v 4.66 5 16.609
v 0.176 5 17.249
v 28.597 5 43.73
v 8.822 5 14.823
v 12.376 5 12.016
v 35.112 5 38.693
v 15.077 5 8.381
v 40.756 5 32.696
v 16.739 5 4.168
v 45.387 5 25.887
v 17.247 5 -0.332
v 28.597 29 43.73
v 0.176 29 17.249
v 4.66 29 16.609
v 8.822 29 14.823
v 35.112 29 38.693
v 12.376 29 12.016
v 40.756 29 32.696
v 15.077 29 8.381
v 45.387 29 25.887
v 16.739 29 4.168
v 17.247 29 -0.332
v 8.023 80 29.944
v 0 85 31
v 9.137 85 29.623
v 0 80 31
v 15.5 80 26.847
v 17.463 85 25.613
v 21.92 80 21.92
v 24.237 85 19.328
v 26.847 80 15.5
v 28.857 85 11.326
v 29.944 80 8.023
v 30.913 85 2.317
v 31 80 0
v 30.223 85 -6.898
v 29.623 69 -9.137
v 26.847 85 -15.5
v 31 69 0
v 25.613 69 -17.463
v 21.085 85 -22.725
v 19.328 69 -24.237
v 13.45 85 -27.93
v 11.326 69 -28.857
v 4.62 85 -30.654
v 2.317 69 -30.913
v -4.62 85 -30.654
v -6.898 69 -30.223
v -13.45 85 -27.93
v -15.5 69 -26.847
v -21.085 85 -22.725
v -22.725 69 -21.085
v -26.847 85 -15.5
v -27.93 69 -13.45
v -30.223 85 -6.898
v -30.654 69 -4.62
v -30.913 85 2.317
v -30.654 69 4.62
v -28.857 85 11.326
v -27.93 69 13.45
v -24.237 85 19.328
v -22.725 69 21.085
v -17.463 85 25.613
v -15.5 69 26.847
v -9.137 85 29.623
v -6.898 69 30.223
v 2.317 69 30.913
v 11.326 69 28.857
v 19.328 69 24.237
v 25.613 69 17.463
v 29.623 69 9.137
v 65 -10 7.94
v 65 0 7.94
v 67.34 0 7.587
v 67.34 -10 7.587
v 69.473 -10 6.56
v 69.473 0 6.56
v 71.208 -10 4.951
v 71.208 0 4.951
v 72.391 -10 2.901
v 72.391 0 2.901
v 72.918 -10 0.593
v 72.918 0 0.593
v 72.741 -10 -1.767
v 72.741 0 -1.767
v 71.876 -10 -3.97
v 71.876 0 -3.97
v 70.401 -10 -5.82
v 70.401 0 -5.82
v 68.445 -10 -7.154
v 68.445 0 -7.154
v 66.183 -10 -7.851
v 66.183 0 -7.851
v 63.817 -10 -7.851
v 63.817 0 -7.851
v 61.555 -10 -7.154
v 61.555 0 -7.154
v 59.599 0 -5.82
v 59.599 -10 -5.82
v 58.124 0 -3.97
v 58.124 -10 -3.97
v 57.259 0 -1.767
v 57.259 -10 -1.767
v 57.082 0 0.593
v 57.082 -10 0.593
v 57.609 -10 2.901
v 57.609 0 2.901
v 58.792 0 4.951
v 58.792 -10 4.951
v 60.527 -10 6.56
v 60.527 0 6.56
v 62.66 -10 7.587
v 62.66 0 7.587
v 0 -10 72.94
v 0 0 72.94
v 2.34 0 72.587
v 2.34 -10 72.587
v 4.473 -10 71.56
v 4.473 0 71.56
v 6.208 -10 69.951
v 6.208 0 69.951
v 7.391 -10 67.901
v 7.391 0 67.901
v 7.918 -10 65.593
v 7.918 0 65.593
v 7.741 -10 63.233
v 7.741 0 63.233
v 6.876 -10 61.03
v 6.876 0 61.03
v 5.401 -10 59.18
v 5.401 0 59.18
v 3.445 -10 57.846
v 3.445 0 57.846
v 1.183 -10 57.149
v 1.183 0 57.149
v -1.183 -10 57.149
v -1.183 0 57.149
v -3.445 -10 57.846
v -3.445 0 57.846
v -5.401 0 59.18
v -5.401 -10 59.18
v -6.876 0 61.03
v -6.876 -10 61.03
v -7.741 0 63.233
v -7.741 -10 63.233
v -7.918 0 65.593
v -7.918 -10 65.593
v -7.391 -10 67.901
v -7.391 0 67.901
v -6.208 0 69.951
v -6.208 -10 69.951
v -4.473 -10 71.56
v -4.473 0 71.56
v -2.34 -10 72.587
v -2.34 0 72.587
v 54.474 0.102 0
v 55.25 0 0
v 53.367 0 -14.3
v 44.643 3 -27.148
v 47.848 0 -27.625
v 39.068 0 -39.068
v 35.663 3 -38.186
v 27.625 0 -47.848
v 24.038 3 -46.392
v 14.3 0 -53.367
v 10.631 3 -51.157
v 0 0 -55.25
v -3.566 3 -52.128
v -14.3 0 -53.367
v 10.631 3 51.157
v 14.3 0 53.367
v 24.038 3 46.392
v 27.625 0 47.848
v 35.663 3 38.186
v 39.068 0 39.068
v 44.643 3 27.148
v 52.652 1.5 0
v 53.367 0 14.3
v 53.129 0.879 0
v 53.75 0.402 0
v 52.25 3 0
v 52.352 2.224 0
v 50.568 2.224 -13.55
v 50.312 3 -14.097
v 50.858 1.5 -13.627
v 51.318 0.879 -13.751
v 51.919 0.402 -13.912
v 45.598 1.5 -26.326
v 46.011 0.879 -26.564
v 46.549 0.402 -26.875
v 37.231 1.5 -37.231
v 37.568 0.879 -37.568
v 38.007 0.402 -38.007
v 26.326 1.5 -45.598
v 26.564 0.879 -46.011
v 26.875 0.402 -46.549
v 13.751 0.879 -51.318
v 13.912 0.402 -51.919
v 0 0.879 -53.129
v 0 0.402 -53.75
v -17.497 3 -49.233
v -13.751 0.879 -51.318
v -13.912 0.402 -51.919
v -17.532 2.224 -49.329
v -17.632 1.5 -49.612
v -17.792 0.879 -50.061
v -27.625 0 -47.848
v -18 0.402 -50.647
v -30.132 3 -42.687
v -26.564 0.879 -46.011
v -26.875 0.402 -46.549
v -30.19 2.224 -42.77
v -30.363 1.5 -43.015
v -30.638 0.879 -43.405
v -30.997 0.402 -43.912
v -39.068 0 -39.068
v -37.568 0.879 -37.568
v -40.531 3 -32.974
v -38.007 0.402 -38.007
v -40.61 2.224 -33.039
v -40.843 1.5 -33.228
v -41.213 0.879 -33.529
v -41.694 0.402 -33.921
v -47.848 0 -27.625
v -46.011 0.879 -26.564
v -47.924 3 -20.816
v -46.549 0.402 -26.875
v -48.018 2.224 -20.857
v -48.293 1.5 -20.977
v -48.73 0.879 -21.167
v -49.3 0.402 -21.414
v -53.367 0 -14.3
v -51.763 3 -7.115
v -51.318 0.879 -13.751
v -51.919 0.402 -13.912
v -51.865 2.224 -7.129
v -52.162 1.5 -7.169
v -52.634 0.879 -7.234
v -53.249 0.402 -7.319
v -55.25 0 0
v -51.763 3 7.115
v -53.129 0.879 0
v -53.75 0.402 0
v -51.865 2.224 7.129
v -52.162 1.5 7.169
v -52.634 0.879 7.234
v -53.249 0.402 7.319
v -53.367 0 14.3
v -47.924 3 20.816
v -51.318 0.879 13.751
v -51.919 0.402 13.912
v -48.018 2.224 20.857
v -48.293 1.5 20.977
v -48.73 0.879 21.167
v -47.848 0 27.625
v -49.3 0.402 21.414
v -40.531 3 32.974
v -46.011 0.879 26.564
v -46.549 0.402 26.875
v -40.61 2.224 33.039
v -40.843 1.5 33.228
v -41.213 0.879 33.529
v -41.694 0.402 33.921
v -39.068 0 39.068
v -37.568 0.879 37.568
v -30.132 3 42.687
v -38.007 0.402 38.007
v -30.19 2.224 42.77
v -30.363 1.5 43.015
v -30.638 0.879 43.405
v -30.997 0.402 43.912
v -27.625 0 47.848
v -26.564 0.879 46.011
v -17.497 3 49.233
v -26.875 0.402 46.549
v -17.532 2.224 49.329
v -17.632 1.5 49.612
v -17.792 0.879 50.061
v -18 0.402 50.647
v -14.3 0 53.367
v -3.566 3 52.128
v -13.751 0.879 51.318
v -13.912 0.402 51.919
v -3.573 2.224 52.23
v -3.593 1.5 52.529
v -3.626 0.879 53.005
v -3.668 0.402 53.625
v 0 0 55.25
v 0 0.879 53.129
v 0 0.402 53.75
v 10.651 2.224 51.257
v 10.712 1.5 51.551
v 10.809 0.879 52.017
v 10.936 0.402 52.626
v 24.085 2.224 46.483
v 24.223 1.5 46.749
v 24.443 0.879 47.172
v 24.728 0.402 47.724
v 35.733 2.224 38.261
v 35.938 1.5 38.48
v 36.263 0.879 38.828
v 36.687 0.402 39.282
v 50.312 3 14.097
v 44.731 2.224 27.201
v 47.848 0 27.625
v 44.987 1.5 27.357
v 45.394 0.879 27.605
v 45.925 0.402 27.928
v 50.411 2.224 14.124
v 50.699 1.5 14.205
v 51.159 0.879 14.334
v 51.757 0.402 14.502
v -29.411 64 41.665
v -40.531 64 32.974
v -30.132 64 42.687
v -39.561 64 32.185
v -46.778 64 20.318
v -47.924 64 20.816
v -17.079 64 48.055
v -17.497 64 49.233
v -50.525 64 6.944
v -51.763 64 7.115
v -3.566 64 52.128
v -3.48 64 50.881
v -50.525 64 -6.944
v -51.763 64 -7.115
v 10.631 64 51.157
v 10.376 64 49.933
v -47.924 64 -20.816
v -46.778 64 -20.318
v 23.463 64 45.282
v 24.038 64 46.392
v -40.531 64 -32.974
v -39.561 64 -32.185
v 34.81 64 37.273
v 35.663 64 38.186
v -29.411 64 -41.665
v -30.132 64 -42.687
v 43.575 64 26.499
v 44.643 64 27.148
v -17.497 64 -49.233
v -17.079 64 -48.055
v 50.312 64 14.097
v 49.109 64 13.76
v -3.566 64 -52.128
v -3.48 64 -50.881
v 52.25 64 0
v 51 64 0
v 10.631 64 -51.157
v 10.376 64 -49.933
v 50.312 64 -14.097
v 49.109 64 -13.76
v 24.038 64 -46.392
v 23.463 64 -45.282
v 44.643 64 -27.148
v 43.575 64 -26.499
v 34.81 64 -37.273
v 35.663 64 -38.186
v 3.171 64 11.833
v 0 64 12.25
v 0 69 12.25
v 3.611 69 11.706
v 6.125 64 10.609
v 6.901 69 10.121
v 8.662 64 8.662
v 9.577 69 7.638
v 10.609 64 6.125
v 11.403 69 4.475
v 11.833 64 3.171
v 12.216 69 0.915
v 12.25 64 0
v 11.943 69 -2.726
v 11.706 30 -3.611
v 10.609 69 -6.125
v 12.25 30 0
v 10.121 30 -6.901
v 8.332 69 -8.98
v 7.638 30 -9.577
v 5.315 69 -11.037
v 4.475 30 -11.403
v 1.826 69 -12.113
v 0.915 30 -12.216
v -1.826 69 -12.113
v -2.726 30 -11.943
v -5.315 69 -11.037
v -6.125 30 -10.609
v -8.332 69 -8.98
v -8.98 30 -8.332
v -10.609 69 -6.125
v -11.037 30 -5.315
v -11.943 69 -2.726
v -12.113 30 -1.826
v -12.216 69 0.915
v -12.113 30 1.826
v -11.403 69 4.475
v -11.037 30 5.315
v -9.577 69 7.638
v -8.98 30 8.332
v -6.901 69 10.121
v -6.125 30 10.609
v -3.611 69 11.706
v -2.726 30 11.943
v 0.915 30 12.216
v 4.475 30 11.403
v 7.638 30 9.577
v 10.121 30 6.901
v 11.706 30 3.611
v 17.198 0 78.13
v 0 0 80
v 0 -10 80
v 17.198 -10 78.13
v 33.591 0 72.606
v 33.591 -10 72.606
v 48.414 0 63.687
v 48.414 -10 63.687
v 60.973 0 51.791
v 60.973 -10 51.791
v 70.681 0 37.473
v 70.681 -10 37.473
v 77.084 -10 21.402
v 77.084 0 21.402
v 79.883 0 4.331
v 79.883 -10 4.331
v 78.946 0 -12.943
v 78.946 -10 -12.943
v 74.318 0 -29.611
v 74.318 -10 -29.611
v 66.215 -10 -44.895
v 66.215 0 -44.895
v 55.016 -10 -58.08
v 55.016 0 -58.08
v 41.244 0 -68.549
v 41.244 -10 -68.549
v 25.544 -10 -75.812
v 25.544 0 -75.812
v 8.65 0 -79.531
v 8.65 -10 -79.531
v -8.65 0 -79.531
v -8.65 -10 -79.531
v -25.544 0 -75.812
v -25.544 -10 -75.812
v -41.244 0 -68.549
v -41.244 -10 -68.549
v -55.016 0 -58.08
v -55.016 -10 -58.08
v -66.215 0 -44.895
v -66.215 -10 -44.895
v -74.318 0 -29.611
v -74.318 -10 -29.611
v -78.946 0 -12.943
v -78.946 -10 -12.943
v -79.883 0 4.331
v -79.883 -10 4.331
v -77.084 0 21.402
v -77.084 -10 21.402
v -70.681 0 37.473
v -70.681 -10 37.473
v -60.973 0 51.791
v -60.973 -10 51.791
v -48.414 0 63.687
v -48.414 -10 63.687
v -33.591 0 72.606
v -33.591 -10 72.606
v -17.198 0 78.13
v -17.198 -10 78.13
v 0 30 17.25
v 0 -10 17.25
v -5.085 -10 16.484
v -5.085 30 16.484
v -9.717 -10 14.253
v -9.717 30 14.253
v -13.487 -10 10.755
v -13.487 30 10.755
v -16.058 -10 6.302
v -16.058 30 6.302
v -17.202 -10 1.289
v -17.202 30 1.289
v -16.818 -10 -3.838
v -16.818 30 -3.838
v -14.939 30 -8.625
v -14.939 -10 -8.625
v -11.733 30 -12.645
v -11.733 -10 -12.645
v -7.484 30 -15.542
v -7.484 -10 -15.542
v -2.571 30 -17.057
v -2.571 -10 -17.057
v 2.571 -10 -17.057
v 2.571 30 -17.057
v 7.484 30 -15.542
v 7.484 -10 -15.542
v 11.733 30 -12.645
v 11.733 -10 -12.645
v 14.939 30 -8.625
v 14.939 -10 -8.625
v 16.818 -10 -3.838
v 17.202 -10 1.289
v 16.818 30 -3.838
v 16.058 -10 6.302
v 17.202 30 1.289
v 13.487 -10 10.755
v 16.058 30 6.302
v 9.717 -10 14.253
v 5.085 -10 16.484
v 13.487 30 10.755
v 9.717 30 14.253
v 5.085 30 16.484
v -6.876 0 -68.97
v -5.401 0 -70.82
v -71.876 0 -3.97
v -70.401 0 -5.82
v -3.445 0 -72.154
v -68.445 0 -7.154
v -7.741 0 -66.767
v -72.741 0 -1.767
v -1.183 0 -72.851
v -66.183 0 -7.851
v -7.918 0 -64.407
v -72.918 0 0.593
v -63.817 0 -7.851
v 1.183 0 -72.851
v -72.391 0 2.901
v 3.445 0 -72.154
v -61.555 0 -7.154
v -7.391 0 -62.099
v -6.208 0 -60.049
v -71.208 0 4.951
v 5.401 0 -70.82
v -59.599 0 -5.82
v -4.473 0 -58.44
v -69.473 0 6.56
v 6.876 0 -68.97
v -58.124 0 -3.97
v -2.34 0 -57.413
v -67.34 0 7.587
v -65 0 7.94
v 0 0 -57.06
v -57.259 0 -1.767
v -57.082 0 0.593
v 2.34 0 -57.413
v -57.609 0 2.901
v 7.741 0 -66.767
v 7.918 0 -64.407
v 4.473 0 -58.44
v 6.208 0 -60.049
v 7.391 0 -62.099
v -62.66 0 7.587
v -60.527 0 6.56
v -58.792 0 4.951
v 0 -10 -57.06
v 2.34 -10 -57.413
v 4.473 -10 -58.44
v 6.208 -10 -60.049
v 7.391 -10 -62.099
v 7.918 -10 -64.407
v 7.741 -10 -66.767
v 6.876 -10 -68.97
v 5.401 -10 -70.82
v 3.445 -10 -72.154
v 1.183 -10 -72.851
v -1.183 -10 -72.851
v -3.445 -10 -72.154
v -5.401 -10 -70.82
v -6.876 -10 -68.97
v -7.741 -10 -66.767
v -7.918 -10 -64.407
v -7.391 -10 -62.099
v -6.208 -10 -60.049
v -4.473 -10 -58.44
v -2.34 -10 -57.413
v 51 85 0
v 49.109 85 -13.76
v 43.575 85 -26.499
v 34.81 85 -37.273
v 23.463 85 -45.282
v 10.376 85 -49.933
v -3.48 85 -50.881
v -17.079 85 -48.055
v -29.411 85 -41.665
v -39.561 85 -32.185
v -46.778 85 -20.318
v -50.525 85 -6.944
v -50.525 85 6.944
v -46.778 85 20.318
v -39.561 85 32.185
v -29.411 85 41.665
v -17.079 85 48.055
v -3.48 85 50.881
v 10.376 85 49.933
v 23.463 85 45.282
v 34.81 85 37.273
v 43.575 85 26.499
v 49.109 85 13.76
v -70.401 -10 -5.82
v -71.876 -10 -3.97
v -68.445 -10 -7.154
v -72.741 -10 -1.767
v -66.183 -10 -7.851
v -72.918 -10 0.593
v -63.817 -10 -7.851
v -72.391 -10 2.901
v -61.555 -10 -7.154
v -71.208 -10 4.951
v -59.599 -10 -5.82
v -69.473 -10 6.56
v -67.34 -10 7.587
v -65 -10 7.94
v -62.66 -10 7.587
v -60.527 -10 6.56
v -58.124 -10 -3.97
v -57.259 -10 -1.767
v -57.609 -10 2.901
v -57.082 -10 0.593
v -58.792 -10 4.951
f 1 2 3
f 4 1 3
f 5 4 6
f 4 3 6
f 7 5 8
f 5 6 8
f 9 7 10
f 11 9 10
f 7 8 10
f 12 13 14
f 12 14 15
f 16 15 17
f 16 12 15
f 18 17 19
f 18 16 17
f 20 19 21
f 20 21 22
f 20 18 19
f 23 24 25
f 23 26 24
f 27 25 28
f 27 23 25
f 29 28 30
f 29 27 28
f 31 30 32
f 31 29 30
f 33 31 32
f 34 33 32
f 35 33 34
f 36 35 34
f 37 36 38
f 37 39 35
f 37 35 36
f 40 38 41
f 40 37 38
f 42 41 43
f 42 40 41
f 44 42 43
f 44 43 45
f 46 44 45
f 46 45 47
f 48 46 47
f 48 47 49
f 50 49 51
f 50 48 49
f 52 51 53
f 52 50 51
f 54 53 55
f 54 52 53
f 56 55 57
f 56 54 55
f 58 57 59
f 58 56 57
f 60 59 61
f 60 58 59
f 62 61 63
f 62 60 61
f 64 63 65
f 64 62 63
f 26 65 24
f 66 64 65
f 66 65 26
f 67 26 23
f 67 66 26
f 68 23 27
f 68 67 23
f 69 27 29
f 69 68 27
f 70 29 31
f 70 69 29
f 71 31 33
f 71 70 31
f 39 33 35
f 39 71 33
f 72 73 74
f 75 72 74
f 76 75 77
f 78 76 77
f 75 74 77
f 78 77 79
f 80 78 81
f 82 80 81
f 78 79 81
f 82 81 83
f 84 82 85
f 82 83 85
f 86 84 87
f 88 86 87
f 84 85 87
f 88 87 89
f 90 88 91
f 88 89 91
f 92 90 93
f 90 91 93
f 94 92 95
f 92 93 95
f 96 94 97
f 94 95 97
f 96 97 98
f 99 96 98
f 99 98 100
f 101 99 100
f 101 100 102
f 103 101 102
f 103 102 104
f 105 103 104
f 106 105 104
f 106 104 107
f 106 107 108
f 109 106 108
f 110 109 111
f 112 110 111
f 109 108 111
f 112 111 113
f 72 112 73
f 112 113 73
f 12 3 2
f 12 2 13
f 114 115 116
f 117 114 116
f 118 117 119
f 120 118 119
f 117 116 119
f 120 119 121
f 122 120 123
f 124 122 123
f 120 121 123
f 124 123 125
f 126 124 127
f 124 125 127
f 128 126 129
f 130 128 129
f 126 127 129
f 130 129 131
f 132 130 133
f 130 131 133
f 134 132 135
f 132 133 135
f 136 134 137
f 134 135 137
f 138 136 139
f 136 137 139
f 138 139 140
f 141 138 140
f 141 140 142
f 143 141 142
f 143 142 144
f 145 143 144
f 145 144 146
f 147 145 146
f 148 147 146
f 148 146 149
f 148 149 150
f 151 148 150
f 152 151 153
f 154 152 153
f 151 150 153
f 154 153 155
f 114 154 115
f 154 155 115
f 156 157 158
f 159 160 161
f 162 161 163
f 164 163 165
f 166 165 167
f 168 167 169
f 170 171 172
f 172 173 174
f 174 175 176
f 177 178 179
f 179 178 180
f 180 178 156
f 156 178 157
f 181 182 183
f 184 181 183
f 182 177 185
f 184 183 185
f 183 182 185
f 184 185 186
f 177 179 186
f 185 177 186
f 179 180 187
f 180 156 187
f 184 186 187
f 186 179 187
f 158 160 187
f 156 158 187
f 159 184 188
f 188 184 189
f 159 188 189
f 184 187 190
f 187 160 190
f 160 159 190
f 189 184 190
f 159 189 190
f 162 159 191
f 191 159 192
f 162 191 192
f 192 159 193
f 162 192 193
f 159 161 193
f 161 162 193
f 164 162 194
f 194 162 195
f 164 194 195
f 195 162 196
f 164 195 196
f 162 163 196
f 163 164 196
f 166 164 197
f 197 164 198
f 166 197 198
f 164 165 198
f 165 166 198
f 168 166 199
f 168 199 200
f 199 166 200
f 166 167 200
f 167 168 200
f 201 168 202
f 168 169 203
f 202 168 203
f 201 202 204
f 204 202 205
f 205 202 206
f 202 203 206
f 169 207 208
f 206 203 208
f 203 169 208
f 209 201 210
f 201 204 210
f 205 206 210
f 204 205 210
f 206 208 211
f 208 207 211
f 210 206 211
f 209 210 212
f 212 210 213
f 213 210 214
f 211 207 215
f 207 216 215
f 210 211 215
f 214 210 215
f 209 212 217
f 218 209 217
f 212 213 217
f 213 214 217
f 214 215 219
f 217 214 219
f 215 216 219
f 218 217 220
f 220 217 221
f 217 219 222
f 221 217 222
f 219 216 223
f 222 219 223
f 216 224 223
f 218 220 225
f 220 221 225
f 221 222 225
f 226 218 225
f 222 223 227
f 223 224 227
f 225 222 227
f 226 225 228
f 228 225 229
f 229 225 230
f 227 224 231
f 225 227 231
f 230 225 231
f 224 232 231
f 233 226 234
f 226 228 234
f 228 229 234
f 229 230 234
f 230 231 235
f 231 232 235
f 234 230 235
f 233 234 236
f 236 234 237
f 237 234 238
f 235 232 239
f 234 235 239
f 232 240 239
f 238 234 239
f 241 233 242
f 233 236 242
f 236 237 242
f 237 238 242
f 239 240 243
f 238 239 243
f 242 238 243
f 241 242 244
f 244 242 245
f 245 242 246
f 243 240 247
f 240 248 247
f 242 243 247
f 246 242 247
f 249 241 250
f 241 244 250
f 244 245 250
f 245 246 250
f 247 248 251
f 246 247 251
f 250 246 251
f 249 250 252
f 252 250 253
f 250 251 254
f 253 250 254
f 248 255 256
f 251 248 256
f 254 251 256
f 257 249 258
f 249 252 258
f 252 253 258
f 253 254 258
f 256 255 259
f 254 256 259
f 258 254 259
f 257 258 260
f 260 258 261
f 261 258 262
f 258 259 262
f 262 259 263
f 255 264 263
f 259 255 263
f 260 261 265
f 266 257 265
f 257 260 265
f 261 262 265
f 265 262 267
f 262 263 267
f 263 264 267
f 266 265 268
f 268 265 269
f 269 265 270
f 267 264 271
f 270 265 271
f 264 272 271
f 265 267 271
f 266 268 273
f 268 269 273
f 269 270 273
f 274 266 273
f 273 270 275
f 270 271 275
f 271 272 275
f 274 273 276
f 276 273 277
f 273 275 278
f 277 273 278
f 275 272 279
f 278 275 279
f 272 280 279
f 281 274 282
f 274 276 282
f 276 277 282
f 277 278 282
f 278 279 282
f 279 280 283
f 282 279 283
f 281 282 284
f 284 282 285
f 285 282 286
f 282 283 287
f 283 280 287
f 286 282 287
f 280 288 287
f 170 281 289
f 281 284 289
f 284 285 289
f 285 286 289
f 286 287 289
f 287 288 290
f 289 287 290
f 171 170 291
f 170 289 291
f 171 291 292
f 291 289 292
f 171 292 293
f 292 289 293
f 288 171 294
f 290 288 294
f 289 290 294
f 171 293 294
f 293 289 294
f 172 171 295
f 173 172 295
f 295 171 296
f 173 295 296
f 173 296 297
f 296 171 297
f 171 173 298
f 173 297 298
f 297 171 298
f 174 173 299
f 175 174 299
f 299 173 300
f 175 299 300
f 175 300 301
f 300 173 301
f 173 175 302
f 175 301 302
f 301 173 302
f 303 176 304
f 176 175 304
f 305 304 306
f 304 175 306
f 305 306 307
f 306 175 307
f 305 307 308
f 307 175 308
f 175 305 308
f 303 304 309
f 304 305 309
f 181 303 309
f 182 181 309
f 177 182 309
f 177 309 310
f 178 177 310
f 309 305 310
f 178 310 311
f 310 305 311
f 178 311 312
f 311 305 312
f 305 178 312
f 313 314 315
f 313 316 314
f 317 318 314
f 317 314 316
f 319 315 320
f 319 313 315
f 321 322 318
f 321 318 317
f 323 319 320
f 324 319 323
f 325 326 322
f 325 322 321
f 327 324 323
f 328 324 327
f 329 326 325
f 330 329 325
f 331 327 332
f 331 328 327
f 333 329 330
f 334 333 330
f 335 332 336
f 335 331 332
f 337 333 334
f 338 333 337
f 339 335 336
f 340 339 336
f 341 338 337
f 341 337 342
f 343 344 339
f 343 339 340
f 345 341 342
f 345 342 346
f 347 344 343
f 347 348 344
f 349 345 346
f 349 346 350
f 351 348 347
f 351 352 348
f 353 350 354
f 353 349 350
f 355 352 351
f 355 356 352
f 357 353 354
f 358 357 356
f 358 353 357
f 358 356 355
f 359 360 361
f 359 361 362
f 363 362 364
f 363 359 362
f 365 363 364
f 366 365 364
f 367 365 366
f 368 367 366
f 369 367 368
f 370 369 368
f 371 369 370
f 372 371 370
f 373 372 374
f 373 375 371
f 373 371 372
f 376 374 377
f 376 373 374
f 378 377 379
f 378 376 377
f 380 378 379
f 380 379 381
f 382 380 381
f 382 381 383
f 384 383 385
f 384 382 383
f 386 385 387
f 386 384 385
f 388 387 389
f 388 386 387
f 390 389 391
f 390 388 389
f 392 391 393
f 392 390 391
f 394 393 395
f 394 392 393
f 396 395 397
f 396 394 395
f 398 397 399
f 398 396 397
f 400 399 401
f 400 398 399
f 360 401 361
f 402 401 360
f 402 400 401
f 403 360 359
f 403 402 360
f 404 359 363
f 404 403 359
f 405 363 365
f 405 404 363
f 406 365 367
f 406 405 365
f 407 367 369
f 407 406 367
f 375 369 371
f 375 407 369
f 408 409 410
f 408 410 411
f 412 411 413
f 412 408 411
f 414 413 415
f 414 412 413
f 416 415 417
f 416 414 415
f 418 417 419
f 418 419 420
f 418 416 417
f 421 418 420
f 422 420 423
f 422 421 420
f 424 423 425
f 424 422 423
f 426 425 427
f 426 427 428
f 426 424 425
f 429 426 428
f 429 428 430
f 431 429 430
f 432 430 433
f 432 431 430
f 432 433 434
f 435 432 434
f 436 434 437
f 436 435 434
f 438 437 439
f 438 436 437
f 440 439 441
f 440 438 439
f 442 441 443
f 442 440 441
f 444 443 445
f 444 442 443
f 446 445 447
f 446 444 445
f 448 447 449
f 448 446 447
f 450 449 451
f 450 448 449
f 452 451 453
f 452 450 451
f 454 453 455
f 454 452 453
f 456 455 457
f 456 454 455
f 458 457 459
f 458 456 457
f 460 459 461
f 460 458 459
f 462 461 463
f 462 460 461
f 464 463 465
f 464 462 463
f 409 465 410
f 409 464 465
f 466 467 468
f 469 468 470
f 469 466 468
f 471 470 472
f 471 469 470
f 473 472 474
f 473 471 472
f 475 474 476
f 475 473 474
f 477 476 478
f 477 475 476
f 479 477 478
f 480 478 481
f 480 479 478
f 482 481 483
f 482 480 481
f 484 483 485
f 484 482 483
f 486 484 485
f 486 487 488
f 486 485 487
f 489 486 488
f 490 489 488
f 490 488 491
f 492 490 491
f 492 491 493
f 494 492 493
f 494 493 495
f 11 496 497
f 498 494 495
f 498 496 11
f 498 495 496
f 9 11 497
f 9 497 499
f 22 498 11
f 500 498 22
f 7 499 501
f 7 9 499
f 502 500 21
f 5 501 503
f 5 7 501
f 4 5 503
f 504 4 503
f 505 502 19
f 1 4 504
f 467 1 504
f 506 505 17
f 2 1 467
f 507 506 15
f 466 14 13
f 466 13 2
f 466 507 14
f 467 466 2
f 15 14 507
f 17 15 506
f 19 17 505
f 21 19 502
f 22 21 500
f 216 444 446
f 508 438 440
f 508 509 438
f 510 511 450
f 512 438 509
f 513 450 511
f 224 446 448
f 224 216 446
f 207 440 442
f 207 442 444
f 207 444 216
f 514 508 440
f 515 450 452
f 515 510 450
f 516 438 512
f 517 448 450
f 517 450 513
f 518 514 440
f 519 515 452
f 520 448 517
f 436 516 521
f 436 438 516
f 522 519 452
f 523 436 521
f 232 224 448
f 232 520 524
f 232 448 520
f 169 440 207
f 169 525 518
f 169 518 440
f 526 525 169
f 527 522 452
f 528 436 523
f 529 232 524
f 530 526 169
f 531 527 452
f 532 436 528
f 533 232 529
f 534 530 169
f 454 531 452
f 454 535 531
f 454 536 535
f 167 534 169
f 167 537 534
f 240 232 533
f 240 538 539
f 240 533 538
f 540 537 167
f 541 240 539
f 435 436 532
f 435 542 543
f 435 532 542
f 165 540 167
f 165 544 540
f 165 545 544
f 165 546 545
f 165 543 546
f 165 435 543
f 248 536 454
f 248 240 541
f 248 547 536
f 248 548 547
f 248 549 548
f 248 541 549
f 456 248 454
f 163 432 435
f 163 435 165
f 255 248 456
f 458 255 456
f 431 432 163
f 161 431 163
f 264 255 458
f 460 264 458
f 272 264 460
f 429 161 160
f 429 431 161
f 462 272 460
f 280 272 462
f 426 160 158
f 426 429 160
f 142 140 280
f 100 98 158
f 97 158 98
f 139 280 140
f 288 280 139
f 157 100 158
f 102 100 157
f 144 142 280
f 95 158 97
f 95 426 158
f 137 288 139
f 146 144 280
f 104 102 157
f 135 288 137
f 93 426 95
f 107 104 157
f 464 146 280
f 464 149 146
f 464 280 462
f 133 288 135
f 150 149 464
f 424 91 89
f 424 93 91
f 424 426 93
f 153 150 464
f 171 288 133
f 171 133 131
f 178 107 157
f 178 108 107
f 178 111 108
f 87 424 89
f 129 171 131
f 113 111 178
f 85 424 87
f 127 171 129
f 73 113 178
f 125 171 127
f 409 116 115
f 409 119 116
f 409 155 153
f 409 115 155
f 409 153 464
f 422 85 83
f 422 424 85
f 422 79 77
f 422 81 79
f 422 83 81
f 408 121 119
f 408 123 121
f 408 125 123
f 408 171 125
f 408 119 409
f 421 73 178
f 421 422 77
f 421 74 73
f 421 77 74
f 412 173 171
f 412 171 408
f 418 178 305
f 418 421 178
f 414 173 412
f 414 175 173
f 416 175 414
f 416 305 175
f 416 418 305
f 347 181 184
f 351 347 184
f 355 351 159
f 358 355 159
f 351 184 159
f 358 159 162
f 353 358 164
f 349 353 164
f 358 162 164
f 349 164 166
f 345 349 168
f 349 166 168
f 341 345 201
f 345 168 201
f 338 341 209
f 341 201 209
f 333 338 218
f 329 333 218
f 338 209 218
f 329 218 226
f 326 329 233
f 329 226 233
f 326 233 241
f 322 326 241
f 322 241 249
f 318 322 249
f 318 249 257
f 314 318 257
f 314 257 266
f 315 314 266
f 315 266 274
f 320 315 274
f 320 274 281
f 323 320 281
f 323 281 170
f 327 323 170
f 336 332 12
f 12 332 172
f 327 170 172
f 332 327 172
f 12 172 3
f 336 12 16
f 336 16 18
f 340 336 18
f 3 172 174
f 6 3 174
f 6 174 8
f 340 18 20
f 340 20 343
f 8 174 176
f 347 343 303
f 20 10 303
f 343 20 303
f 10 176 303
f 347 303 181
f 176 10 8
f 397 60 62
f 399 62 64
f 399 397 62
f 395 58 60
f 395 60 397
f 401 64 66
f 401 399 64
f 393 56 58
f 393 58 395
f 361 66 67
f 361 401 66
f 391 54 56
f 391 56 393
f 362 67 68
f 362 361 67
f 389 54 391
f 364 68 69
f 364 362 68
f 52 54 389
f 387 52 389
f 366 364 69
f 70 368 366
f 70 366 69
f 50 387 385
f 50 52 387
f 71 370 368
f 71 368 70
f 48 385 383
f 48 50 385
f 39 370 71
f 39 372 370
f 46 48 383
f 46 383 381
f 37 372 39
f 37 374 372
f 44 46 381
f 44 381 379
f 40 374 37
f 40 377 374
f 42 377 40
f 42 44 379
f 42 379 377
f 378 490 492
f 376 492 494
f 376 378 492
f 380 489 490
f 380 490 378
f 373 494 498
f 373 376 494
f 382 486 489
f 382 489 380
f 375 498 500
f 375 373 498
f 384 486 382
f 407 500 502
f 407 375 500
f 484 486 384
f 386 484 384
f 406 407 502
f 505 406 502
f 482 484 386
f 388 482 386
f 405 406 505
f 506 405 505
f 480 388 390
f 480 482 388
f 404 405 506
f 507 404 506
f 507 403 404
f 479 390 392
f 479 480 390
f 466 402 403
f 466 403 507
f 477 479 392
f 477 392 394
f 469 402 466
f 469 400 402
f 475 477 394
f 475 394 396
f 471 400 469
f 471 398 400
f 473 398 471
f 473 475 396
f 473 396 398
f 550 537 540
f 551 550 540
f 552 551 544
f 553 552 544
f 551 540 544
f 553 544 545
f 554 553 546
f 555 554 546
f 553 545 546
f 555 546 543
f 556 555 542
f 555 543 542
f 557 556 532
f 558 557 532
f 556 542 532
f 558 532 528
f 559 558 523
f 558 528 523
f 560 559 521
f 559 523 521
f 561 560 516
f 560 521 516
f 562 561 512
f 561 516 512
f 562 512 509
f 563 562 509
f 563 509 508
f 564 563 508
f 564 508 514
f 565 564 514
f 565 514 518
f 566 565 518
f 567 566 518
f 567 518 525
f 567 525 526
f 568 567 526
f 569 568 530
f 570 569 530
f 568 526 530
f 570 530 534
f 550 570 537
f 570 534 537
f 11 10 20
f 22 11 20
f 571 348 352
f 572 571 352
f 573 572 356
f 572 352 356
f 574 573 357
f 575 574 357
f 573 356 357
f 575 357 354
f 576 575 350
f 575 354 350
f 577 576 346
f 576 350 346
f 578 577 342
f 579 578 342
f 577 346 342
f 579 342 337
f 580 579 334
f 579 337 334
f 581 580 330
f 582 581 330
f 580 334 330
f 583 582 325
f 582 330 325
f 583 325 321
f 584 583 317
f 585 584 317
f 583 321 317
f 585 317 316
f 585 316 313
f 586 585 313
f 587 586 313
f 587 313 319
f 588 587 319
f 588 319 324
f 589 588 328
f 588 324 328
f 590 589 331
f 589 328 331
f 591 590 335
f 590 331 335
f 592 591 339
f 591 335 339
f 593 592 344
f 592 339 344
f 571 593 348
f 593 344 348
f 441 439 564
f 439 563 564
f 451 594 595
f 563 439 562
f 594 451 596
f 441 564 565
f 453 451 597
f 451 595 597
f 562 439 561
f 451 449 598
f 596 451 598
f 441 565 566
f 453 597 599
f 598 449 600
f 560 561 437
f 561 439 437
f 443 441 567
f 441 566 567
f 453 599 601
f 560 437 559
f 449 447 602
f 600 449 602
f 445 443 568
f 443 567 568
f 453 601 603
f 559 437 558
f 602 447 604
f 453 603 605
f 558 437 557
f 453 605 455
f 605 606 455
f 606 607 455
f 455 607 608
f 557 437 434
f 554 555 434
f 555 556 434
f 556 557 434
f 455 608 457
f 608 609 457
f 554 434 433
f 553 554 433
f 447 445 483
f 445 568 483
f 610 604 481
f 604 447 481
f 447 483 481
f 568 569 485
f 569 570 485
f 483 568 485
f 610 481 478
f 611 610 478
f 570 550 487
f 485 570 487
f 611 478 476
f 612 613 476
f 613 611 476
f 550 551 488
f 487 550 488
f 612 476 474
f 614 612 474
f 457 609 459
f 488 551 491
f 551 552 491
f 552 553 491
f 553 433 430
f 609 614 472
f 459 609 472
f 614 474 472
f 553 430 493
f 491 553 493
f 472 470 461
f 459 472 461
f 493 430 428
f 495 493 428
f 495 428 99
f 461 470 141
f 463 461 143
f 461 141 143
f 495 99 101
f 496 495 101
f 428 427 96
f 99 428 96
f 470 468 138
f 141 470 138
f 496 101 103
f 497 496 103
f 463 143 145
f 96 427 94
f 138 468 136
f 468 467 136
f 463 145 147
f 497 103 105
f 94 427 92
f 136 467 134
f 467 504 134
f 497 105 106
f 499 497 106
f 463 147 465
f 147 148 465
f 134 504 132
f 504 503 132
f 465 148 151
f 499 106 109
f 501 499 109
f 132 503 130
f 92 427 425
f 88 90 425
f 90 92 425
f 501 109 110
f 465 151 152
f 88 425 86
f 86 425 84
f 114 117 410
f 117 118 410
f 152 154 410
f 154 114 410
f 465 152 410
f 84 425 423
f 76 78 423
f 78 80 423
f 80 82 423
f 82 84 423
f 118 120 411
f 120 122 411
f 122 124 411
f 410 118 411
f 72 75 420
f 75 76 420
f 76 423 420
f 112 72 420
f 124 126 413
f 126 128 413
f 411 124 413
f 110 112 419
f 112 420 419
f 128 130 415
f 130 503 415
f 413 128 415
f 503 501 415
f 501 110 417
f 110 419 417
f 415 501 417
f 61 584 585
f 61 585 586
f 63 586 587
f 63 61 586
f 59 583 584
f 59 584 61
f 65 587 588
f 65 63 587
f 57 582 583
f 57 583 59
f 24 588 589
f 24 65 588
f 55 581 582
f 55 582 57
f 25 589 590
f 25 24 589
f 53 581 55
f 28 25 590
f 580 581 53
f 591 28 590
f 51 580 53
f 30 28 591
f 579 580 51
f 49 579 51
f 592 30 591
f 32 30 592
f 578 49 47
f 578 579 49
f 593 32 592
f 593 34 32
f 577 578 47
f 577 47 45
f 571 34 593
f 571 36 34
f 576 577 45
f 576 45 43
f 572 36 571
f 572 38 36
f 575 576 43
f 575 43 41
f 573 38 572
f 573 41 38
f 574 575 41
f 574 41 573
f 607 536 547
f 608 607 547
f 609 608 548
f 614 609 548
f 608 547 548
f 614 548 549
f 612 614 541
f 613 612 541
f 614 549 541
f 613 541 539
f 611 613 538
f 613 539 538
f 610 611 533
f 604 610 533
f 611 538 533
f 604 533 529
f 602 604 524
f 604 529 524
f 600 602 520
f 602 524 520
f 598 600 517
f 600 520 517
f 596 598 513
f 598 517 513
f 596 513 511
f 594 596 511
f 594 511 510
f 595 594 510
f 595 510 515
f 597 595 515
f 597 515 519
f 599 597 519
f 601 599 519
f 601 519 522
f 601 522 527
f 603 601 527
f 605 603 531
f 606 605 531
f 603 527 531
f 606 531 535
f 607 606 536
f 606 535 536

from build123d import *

# Parameters (mm, degrees)
CROQUIS1_R                  = 52.25
CROQUIS1_R_2                = 12.25
EXTRUIR_L_MINA1_DEPTH       = 64
CROQUIS3_R                  = 80
CROQUIS3_R_2                = 17.25
SALIENTE_EXTRUIR1_DEPTH     = 10
EXTRUIR_L_MINA2_OUTLINE_R   = 51
EXTRUIR_L_MINA2_OUTLINE_R_2 = 31
EXTRUIR_L_MINA2_DEPTH       = 21
EXTRUIR_L_MINA2_2_OUTLINE_R = 31
EXTRUIR_L_MINA2_2_DEPTH     = 5
EXTRUIR_L_MINA2_START       = 16
EXTRUIR_L_MINA2_3_OUTLINE_R = 31
EXTRUIR_L_MINA2_3_DEPTH     = 5
CORTAR_EXTRUIR2_START       = -8
CROQUIS6_R                  = 31
CORTAR_EXTRUIR2_DEPTH       = 8
CORTAR_EXTRUIR4_START       = -23
CROQUIS7_R                  = 12.25
CORTAR_EXTRUIR4_DEPTH       = 23
CROQUIS8_R                  = 7.94
CORTAR_EXTRUIR5_DEPTH       = 10
REDONDEO3_R                 = 3
CORTAR_EXTRUIR6_START       = -40
CROQUIS9_R                  = 17.25
CORTAR_EXTRUIR6_DEPTH       = 40
CROQUIS10_W                 = 24.5
CROQUIS10_H                 = 16
CORTAR_EXTRUIR7_DEPTH       = 42
CROQUIS11_W                 = 24.5
CROQUIS11_H                 = 8
CORTAR_EXTRUIR8_DEPTH       = 42


# Read off the part's stored shape, not the designer's step: Extruir-Lámina2
with BuildPart() as part:
    # Croquis1 → Extruir-Lámina1 (new body)
    with BuildSketch(Plane(origin=(0, 0, 0), x_dir=(1, 0, 0), z_dir=(0, 1, 0))):
        Circle(CROQUIS1_R)
        Circle(CROQUIS1_R_2, mode=Mode.SUBTRACT)
    extrude(amount=EXTRUIR_L_MINA1_DEPTH)

    # Croquis3 → Saliente-Extruir1 (add)
    with BuildSketch(Plane(origin=(0, 0, 0), x_dir=(1, 0, 0), z_dir=(0, 1, 0))):
        with Locations(Location((0, 0, 0), (0, 0, 270))):
            Circle(CROQUIS3_R)
        with Locations(Location((0, 0, 0), (0, 0, 270))):
            Circle(CROQUIS3_R_2, mode=Mode.SUBTRACT)
    extrude(amount=-SALIENTE_EXTRUIR1_DEPTH)

    # Extruir-Lámina2 outline → Extruir-Lámina2 (add)
    with BuildSketch(Plane(origin=(0, 64, 0), x_dir=(1, 0, 0), z_dir=(0, 1, 0))):
        Circle(EXTRUIR_L_MINA2_OUTLINE_R)
        Circle(EXTRUIR_L_MINA2_OUTLINE_R_2, mode=Mode.SUBTRACT)
    extrude(amount=EXTRUIR_L_MINA2_DEPTH)

    # Extruir-L_mina2 2 outline → Extruir-L_mina2 2 (add)
    with BuildSketch(Plane(origin=(0, 64, 0), x_dir=(1, 0, 0), z_dir=(0, 1, 0))):
        Circle(EXTRUIR_L_MINA2_2_OUTLINE_R)
    extrude(amount=EXTRUIR_L_MINA2_2_DEPTH)

    # Extruir-L_mina2 3 outline → Extruir-L_mina2 3 (add)
    with BuildSketch(Plane(origin=(0, 64, 0), x_dir=(1, 0, 0), z_dir=(0, 1, 0)).offset(EXTRUIR_L_MINA2_START)):
        Circle(EXTRUIR_L_MINA2_3_OUTLINE_R)
    extrude(amount=EXTRUIR_L_MINA2_3_DEPTH)

    # Croquis6 → Cortar-Extruir2 (cut)
    with BuildSketch(Plane(origin=(0, 85, 0), x_dir=(1, 0, 0), z_dir=(0, 1, 0)).offset(CORTAR_EXTRUIR2_START)):
        with Locations(Location((0, 0, 0), (0, 0, 270))):
            Circle(CROQUIS6_R)
    extrude(amount=CORTAR_EXTRUIR2_DEPTH, mode=Mode.SUBTRACT)

    # Croquis7 → Cortar-Extruir4 (cut)
    with BuildSketch(Plane(origin=(0, 69, 0), x_dir=(1, 0, 0), z_dir=(0, 1, 0)).offset(CORTAR_EXTRUIR4_START)):
        with Locations(Location((0, 0, 0), (0, 0, 270))):
            Circle(CROQUIS7_R)
    extrude(amount=CORTAR_EXTRUIR4_DEPTH, mode=Mode.SUBTRACT)

    # Croquis8 → Cortar-Extruir5 (cut)
    with BuildSketch(Plane(origin=(0, 0, 0), x_dir=(1, 0, 0), z_dir=(0, 1, 0))):
        with Locations(Location((0, 65, 0), (0, 0, 270))):
            Circle(CROQUIS8_R)
        with Locations(Location((65, 0, 0), (0, 0, 270))):
            Circle(CROQUIS8_R)
        with Locations(Location((0, -65, 0), (0, 0, 270))):
            Circle(CROQUIS8_R)
        with Locations(Location((-65, 0, 0), (0, 0, 270))):
            Circle(CROQUIS8_R)
    extrude(amount=-CORTAR_EXTRUIR5_DEPTH, mode=Mode.SUBTRACT)

    # Redondeo3
    redondeo3_edges = [part.edges().sort_by_distance(p)[0] for p in [
        (-52.25, 0, 0),
    ]]
    fillet(redondeo3_edges, radius=REDONDEO3_R)

    # Croquis9 → Cortar-Extruir6 (cut)
    with BuildSketch(Plane(origin=(0, -10, 0), x_dir=(-1, 0, 0), z_dir=(0, -1, 0)).offset(CORTAR_EXTRUIR6_START)):
        with Locations(Location((0, 0, 0), (0, 0, 270))):
            Circle(CROQUIS9_R)
    extrude(amount=CORTAR_EXTRUIR6_DEPTH, mode=Mode.SUBTRACT)

    # Croquis10 → Cortar-Extruir7 (cut)
    with BuildSketch(Plane(origin=(38.228136726, 0, 35.618423077), x_dir=(0.6816923076923129, 0, -0.7316389803947908), z_dir=(0.7316389803947908, 0, 0.6816923076923129))):
        with Locations((-0.249897299, 21)):
            Rectangle(CROQUIS10_W, CROQUIS10_H)
    extrude(amount=-CORTAR_EXTRUIR7_DEPTH, mode=Mode.SUBTRACT)

    # Croquis11 → Cortar-Extruir8 (cut)
    with BuildSketch(Plane(origin=(38.228136726, 0, 35.618423077), x_dir=(0.6816923076923129, 0, -0.7316389803947908), z_dir=(0.7316389803947908, 0, 0.6816923076923129))):
        with Locations((-0.249897299, 9)):
            Rectangle(CROQUIS11_W, CROQUIS11_H)
    extrude(amount=-CORTAR_EXTRUIR8_DEPTH, mode=Mode.SUBTRACT)


solid = part.part
